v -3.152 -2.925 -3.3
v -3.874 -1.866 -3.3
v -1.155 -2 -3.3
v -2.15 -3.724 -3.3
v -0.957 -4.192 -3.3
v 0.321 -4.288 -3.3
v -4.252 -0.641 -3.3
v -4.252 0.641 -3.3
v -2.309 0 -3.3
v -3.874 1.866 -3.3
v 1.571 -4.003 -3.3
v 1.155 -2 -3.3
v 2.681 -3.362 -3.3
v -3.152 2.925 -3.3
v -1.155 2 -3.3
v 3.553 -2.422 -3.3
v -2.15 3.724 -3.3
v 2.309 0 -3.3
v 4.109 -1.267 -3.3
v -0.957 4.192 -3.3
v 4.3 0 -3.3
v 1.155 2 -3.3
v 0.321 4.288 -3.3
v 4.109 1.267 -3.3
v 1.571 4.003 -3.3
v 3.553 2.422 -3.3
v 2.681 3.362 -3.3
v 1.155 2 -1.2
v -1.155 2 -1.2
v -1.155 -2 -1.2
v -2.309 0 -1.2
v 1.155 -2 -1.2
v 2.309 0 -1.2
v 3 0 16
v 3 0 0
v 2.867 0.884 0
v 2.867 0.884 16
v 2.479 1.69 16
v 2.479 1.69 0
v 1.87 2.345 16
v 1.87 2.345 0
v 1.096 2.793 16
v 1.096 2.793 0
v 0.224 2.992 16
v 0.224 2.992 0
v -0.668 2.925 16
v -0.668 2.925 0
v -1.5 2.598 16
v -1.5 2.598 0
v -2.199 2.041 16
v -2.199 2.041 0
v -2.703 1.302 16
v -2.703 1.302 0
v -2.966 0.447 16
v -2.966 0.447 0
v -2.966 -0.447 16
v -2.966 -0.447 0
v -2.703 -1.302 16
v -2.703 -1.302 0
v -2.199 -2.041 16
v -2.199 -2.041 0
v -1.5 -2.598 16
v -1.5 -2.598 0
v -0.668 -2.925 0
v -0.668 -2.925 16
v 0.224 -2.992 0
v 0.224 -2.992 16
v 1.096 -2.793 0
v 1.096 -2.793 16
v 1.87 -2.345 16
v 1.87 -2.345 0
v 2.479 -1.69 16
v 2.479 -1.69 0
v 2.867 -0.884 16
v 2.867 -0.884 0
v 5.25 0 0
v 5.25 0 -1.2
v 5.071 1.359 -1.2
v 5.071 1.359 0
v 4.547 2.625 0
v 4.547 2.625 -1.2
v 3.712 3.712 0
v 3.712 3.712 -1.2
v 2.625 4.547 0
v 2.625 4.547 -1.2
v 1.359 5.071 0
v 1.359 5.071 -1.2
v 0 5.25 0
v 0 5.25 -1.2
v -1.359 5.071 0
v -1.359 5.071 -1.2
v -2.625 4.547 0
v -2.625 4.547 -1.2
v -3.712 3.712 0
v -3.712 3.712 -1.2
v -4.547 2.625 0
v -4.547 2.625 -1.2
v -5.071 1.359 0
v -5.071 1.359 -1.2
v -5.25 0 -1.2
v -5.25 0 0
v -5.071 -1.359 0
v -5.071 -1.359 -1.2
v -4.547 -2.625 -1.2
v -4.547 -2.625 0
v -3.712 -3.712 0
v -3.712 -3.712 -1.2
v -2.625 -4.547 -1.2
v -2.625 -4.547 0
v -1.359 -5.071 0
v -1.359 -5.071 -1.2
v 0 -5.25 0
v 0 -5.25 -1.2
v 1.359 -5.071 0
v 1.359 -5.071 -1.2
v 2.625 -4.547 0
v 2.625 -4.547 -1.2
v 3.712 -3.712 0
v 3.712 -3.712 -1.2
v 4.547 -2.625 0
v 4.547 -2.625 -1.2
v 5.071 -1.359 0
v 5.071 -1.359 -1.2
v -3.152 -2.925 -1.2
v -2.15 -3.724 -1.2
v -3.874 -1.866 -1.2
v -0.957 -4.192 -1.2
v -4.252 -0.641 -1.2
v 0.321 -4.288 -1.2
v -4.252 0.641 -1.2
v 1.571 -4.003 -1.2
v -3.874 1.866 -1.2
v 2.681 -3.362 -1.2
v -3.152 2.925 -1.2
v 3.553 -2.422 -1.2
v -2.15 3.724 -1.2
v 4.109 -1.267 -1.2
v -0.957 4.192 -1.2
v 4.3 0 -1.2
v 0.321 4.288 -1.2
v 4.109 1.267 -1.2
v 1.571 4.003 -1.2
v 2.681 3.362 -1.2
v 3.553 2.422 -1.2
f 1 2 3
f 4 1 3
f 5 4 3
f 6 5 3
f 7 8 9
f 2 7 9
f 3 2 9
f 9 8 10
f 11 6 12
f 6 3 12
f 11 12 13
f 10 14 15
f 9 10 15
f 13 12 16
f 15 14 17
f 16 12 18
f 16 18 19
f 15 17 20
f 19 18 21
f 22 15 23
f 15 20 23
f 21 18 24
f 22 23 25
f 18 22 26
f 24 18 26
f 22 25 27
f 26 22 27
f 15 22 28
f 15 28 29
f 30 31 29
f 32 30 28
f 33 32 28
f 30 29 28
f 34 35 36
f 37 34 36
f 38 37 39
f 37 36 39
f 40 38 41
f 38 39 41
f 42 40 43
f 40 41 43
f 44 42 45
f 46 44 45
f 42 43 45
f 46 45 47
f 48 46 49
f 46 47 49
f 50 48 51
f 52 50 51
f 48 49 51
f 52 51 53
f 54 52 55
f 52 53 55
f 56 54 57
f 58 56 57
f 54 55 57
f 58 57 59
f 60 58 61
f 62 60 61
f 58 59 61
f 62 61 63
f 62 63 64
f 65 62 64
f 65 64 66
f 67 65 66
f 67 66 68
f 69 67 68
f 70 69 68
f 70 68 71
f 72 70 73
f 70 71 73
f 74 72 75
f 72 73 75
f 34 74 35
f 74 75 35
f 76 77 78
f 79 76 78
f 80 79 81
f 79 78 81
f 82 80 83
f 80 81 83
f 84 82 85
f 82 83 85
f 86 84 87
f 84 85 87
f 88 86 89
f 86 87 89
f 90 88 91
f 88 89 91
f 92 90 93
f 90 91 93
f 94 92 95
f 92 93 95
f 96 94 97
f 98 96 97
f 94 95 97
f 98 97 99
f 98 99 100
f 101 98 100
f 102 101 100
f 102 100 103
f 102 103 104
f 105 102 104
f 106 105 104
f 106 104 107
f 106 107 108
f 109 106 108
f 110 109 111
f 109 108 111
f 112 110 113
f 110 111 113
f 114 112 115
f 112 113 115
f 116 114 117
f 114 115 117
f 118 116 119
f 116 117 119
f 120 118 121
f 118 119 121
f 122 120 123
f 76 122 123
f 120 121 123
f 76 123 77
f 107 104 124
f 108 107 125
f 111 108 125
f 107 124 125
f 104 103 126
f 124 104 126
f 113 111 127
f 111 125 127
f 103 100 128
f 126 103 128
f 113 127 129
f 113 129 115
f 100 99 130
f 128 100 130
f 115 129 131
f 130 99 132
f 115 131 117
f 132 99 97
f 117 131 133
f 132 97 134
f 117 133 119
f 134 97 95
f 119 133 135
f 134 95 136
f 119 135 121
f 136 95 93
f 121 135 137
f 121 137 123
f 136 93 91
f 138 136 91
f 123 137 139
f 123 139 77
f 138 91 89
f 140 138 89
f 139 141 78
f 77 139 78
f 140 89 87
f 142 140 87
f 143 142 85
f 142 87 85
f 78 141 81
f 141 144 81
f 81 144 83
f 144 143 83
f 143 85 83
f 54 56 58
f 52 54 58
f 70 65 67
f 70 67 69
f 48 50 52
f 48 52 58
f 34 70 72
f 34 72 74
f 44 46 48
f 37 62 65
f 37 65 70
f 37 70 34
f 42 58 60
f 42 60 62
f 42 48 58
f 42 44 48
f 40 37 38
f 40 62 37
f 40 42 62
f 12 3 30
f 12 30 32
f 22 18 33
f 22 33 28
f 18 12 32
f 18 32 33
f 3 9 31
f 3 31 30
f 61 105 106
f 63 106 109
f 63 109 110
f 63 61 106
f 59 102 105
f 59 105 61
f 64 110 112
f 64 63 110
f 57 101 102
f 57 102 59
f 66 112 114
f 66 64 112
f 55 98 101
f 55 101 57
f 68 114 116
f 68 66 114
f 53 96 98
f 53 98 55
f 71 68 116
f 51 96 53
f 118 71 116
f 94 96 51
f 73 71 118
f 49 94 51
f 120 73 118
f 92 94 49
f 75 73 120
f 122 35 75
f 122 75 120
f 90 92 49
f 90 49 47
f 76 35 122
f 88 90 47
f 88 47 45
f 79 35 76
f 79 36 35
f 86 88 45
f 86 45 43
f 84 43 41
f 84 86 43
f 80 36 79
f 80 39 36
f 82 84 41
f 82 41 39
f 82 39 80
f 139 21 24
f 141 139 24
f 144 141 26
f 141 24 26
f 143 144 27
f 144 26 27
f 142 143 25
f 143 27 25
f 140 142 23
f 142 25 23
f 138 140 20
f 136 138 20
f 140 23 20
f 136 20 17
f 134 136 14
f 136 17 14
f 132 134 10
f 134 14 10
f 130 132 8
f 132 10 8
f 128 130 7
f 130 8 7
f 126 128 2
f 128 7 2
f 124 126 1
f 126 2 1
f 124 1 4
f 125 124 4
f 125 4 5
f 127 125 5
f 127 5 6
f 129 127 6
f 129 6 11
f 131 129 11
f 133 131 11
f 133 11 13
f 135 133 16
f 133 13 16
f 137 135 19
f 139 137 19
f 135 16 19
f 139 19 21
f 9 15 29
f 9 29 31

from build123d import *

# Parameters (mm, degrees)
S01_M6_THREADED_SHANK_R                  = 3
F_01_M6_THREADED_SHANK_DEPTH             = 16
F_02_START                               = -1.2
S02_BUTTON_HEAD_CLEARING_DIAMETER_R      = 5.25
F_02_BUTTON_HEAD_CLEARING_DIAMETER_DEPTH = 1.2
F_03_START                               = -3.3
S03_BUTTON_CROWN_R                       = 4.3
F_03_BUTTON_CROWN_DEPTH                  = 2.1
F_04_START                               = -3.4
F_04_4_MM_HEX_SOCKET_DEPTH               = 2.2


with BuildPart() as part:
    # S01 - M6 threaded shank → 01 - M6 threaded shank (new body)
    with BuildSketch(Plane.XY):
        Circle(S01_M6_THREADED_SHANK_R)
    extrude(amount=F_01_M6_THREADED_SHANK_DEPTH)

    # S02 - Button head clearing diameter → 02 - Button head clearing diameter (add)
    with BuildSketch(Plane.XY.offset(F_02_START)):
        Circle(S02_BUTTON_HEAD_CLEARING_DIAMETER_R)
    extrude(amount=F_02_BUTTON_HEAD_CLEARING_DIAMETER_DEPTH)

    # S03 - Button crown → 03 - Button crown (add)
    with BuildSketch(Plane.XY.offset(F_03_START)):
        Circle(S03_BUTTON_CROWN_R)
    extrude(amount=F_03_BUTTON_CROWN_DEPTH)

    # S04 - 4 mm hex socket → 04 - 4 mm hex socket (cut)
    with BuildSketch(Plane.XY.offset(F_04_START)):
        Polygon((2.309401077, 0), (1.154700538, 2), (-1.154700538, 2), (-2.309401077, 0), (-1.154700538, -2), (1.154700538, -2), align=None)
    extrude(amount=F_04_4_MM_HEX_SOCKET_DEPTH, mode=Mode.SUBTRACT)


solid = part.part
